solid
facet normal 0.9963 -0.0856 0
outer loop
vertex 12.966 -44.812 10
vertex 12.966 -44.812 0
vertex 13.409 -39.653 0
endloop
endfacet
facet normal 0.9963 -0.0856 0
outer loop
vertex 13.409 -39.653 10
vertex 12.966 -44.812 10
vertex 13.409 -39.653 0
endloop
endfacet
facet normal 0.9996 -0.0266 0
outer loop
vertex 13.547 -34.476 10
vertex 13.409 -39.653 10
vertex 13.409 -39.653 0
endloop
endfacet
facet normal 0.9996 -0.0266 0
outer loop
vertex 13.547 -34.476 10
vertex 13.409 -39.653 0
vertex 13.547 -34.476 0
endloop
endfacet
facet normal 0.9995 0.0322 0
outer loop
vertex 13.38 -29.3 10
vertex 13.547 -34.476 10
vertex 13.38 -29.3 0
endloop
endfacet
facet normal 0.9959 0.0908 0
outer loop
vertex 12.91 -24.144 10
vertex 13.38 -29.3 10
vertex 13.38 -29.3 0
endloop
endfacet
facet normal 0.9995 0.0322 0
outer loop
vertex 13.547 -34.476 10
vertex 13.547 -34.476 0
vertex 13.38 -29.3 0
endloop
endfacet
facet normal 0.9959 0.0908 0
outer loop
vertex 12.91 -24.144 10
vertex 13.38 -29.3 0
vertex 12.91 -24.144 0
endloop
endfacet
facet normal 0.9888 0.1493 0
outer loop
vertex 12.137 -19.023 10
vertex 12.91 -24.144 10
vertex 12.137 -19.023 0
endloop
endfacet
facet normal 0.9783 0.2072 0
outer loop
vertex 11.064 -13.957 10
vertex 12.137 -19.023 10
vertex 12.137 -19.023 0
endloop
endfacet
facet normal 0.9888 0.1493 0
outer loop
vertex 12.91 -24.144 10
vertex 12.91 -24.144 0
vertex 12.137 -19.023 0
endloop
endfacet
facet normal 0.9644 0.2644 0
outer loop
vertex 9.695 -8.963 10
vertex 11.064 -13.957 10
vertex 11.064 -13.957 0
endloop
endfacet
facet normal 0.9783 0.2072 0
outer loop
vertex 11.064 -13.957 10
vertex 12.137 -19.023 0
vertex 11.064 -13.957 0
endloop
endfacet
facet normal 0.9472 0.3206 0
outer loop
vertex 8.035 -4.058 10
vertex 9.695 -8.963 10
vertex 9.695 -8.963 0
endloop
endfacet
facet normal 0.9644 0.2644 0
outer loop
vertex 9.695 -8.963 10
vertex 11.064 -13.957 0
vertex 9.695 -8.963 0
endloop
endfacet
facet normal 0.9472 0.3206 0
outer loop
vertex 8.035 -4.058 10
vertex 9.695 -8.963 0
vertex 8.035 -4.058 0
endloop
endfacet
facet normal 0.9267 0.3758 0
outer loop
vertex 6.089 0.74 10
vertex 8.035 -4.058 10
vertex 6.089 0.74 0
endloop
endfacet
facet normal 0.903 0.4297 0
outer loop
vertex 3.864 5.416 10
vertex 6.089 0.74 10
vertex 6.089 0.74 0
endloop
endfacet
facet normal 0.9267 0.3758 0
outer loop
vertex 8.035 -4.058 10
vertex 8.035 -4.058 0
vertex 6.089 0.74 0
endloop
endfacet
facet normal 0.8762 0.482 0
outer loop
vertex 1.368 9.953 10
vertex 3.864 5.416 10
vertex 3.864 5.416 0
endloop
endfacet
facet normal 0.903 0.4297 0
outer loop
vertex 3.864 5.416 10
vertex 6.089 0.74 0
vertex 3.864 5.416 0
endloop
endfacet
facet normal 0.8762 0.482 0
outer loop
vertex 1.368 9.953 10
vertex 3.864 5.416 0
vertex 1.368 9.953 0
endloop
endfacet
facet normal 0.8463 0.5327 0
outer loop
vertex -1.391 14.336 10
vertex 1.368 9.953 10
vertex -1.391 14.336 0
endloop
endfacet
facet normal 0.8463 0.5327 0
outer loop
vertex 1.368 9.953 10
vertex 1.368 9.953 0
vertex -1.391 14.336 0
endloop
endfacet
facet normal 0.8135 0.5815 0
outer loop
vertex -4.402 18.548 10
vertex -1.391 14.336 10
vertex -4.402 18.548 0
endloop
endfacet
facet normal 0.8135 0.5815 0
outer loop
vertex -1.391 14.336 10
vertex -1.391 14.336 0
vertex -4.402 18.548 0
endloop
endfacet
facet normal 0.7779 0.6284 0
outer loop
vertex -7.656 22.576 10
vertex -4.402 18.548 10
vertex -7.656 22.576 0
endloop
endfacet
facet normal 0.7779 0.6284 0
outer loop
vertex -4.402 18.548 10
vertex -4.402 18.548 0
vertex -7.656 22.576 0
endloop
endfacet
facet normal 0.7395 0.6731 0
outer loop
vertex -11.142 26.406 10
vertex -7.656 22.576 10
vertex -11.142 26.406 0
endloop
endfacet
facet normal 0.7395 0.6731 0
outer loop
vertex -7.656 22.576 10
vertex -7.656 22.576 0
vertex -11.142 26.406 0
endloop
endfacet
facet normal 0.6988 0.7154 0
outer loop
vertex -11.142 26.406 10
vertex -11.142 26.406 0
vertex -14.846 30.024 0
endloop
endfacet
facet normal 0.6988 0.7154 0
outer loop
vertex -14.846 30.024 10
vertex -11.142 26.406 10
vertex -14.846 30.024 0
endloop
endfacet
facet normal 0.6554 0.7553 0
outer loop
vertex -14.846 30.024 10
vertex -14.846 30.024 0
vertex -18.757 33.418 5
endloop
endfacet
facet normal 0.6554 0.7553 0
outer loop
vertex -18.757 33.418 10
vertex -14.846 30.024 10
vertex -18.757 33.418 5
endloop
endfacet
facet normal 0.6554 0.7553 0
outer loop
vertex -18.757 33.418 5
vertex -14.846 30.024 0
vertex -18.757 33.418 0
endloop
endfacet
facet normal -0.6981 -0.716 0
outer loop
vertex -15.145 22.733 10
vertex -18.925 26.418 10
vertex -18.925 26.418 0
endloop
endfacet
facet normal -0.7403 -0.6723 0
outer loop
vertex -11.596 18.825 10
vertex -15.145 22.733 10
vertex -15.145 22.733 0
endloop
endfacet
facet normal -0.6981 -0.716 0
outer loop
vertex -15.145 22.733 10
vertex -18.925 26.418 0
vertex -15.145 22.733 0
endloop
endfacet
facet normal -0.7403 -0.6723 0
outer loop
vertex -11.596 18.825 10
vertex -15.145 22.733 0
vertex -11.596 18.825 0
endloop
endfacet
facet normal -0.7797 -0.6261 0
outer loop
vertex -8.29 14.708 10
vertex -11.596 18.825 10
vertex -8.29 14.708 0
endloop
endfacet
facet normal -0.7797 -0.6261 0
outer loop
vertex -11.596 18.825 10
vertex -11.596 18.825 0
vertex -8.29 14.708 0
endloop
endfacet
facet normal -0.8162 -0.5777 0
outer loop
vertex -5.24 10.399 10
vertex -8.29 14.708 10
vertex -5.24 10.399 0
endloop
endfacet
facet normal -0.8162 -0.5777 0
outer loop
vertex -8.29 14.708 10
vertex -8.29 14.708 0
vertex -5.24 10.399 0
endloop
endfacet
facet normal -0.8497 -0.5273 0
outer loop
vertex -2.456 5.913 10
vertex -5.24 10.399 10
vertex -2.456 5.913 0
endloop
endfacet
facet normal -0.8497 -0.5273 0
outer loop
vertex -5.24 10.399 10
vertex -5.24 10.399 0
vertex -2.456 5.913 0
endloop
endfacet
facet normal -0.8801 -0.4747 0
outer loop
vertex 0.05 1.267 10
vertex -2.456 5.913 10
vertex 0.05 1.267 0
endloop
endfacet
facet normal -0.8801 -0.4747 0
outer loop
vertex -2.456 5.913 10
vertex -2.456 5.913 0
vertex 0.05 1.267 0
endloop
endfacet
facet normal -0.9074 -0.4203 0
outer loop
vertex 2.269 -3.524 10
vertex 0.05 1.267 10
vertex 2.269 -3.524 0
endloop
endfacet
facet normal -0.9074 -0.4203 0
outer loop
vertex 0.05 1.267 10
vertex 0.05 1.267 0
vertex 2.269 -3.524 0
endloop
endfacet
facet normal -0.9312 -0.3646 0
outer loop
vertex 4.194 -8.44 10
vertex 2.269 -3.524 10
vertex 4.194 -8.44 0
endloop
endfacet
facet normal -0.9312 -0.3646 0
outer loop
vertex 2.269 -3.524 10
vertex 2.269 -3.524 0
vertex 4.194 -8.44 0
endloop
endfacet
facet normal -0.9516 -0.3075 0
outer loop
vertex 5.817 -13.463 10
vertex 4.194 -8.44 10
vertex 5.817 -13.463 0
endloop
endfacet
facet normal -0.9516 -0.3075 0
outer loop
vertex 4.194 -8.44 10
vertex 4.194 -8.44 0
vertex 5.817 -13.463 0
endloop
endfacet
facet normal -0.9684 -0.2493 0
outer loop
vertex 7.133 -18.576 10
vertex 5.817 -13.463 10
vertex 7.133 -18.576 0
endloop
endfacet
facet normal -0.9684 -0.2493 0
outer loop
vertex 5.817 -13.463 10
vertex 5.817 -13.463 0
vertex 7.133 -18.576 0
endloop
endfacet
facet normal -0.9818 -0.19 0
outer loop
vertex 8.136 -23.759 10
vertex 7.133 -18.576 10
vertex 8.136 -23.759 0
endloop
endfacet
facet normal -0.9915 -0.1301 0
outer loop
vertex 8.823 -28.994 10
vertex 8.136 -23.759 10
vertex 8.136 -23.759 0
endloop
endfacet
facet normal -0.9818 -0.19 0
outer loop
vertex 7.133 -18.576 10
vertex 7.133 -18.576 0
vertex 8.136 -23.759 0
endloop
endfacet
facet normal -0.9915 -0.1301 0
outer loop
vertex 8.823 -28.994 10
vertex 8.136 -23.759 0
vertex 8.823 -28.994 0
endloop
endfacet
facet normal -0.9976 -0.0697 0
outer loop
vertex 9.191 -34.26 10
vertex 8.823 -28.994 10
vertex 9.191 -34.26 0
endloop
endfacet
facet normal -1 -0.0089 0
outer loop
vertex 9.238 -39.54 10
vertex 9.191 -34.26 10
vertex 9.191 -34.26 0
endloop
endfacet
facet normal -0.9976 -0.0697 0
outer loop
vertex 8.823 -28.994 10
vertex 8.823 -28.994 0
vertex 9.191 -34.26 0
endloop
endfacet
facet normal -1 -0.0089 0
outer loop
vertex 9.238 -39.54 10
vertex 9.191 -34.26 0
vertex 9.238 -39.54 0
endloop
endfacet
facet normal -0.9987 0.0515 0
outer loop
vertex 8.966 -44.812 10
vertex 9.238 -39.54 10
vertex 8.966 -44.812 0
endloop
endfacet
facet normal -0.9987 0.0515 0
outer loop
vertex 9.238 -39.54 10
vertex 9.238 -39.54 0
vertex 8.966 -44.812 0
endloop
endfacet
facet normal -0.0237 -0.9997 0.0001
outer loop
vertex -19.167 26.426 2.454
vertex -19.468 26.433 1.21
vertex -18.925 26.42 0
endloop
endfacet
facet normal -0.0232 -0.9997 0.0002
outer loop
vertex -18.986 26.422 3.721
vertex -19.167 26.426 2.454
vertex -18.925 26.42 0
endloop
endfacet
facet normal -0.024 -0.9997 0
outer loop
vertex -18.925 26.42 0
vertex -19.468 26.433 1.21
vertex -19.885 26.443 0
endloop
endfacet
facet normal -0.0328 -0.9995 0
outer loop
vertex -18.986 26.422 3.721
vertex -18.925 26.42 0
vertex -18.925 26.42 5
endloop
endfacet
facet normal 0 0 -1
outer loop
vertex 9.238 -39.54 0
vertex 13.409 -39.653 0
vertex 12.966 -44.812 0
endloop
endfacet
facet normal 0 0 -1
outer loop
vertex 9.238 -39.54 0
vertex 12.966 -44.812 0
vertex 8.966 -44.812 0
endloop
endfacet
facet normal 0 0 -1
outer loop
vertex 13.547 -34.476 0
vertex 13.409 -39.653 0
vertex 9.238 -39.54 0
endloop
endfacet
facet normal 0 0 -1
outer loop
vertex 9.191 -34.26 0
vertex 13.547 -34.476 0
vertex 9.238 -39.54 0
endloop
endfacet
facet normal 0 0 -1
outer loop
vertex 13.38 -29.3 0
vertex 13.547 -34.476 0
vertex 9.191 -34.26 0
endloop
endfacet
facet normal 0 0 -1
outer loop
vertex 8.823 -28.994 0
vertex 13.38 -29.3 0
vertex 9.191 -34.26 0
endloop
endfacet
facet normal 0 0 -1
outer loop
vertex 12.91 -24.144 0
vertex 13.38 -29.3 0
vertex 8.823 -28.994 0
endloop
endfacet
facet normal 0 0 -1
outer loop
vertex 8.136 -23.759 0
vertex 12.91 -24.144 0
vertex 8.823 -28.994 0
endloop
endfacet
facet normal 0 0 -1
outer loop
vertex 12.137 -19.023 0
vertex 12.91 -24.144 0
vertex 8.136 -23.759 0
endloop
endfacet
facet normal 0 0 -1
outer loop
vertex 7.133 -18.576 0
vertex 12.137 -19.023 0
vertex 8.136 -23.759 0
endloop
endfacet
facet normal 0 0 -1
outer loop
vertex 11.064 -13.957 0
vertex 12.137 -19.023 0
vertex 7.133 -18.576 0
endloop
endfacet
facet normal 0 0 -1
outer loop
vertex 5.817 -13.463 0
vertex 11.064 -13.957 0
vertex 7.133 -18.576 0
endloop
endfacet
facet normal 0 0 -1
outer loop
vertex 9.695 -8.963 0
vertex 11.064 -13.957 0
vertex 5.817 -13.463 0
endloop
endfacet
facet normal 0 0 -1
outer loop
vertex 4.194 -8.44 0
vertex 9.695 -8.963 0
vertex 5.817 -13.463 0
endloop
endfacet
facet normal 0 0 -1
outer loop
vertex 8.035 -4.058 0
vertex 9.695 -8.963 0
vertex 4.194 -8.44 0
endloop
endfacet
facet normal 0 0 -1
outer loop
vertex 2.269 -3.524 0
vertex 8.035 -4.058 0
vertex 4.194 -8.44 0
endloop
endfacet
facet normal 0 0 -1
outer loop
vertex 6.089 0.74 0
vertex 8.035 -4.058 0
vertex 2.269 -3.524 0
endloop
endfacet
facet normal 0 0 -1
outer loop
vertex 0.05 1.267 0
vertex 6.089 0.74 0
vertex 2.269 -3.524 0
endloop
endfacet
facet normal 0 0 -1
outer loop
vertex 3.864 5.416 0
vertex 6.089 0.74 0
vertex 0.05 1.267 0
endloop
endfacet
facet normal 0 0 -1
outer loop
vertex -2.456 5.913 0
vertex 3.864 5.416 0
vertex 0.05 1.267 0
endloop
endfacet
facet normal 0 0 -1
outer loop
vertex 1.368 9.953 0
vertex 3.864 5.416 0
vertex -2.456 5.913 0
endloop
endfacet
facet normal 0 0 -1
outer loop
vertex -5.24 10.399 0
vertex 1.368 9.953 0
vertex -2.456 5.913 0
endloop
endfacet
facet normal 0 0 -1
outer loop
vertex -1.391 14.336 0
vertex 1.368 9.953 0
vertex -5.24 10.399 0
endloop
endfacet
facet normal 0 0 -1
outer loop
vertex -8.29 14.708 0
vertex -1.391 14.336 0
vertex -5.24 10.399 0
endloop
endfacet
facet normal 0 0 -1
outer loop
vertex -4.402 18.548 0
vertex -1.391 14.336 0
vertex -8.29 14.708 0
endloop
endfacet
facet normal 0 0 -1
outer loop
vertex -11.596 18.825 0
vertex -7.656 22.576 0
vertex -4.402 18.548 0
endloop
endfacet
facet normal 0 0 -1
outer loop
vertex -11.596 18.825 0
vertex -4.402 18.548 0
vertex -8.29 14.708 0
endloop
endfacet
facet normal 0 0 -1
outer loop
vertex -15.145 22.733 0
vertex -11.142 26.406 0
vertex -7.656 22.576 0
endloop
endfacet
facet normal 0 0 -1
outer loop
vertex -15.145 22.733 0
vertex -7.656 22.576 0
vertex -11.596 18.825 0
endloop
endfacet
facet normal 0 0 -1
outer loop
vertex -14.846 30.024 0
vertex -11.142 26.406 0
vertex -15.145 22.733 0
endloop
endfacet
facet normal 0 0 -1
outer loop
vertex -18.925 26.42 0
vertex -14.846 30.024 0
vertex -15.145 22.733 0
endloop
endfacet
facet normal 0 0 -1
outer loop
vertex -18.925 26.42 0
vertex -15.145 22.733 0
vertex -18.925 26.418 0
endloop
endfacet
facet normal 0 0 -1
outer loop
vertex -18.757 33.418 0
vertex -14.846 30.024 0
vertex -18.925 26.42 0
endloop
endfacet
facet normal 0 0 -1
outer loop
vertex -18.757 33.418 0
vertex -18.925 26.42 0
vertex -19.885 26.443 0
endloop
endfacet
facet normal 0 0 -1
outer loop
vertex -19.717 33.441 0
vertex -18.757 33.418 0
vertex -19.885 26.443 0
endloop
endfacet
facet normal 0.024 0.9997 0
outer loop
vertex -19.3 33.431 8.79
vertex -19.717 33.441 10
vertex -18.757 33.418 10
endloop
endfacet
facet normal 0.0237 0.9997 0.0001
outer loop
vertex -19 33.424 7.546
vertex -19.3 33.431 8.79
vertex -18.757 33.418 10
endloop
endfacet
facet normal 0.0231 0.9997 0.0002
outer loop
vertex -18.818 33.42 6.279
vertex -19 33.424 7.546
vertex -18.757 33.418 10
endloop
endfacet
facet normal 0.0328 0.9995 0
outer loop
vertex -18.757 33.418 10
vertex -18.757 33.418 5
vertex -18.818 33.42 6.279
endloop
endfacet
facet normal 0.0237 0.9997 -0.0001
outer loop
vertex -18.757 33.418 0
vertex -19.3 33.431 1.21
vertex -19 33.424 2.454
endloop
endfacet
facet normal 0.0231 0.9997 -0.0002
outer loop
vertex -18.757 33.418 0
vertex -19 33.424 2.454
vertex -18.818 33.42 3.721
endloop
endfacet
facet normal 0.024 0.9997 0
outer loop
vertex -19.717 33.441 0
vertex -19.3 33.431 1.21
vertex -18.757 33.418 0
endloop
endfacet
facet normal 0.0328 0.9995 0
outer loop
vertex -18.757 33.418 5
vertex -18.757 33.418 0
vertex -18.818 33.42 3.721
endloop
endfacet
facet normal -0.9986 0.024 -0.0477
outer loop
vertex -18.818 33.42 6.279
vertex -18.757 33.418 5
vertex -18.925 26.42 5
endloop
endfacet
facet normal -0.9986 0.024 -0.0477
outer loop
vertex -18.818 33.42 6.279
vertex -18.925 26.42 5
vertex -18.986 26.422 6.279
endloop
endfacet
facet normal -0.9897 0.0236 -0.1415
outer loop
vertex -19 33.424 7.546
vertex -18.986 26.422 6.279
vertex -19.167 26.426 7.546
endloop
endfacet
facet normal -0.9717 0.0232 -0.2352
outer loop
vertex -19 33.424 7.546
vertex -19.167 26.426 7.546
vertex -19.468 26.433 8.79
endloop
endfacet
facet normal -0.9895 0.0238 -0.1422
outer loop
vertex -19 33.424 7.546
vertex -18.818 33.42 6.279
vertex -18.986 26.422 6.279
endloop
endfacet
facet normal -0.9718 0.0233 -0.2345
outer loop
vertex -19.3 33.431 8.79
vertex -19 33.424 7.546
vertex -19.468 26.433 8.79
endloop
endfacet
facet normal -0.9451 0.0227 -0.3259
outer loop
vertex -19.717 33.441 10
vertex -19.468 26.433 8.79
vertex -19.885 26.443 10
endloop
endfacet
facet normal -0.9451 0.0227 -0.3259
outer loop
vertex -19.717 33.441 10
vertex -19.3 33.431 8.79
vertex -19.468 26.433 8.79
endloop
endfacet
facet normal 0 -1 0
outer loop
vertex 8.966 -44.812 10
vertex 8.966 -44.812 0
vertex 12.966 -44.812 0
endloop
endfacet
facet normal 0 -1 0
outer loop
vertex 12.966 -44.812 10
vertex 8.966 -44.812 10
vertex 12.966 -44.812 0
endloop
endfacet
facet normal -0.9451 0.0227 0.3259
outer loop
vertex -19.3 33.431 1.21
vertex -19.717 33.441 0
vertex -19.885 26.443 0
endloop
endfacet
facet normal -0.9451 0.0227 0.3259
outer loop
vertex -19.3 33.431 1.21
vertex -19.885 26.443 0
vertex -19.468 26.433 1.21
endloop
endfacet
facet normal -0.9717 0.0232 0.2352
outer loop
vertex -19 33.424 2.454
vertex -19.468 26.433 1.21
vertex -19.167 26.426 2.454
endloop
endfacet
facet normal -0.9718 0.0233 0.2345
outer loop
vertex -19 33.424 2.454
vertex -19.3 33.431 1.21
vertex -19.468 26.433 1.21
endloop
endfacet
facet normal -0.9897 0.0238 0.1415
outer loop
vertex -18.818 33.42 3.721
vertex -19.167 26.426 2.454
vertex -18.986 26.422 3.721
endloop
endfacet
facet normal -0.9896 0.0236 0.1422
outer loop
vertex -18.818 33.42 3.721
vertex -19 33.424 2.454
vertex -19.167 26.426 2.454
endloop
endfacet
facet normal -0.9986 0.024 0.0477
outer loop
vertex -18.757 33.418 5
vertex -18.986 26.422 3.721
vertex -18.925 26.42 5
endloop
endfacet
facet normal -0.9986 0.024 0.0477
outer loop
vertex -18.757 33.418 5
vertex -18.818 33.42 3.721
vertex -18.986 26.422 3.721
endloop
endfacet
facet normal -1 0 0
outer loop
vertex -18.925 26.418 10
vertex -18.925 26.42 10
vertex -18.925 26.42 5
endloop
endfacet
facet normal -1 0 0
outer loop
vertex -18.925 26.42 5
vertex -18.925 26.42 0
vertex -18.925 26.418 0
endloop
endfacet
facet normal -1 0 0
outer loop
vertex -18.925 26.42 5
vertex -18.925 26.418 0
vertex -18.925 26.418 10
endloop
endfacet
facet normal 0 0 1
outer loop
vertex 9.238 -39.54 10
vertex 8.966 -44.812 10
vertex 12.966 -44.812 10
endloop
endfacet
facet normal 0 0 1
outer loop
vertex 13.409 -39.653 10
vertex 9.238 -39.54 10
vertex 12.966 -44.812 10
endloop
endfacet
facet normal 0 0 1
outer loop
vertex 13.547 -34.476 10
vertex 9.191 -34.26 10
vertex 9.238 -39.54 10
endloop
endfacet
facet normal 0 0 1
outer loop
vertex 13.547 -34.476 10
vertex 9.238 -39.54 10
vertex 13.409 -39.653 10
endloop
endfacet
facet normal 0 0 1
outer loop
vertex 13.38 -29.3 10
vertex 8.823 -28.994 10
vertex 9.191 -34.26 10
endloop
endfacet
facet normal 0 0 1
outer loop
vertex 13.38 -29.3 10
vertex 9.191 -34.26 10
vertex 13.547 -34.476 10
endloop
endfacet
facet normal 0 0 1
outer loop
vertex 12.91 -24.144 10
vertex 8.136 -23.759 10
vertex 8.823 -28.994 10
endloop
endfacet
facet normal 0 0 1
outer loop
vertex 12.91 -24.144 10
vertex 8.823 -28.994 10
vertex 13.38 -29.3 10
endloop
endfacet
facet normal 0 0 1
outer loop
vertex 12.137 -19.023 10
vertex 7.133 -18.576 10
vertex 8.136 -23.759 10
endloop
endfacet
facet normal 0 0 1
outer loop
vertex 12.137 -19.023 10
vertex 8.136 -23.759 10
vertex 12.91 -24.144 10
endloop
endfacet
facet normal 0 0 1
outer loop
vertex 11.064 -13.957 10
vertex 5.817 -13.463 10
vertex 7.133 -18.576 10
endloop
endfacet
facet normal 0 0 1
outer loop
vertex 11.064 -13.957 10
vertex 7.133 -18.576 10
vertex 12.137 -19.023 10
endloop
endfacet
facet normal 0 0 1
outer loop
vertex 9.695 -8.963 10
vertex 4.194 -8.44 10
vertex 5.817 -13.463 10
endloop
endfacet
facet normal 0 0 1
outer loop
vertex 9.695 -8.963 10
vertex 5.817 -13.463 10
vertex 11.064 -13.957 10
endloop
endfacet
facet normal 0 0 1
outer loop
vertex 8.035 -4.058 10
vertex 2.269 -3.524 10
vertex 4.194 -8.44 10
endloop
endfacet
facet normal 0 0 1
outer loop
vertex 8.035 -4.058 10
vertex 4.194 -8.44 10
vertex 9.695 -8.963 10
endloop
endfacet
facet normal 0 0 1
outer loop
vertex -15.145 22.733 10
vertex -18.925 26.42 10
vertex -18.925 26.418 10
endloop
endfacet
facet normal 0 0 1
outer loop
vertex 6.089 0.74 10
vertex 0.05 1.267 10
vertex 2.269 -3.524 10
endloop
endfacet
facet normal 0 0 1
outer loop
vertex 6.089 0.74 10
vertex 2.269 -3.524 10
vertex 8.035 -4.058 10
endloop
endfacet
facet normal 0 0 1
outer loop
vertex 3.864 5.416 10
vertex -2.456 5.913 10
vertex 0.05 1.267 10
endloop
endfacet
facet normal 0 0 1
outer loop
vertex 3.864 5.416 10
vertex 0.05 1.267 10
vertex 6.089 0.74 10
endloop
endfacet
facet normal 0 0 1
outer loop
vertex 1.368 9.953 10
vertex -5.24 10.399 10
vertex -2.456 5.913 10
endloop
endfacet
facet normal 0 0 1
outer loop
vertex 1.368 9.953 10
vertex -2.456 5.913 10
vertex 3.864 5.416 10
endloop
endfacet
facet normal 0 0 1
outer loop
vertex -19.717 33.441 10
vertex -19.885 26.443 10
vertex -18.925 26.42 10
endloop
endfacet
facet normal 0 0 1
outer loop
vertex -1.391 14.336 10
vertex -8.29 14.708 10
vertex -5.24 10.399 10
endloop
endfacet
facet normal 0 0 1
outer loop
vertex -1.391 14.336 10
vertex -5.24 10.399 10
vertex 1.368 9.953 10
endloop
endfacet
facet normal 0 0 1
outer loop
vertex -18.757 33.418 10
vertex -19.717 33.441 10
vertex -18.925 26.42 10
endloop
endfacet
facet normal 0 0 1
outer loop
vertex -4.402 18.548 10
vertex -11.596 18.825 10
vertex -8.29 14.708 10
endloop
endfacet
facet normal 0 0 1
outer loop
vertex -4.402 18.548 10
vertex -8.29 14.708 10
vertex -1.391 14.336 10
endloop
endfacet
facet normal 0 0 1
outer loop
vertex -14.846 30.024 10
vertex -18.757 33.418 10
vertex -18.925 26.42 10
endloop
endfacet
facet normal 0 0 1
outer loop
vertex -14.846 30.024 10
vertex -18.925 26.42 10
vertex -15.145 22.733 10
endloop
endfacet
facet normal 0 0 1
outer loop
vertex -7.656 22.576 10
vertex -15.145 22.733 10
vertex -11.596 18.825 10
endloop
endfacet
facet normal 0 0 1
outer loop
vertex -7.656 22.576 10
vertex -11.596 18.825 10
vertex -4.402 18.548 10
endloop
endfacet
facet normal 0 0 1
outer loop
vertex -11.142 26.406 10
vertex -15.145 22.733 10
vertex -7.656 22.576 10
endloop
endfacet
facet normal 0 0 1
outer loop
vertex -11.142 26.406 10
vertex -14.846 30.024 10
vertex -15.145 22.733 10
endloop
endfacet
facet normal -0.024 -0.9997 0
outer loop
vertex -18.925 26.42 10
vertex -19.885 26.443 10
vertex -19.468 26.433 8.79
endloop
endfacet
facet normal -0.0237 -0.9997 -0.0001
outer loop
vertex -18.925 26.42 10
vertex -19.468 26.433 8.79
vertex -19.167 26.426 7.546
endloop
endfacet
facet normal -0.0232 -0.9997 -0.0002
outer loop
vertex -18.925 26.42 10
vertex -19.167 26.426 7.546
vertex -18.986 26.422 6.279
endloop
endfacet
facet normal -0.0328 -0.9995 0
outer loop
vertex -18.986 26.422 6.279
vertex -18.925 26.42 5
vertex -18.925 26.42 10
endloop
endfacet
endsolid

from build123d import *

# Parameters (mm, degrees)
BOSS_EXTRUDE1_DEPTH = 10
BOSS_EXTRUDE2_DEPTH = 7


with BuildPart() as part:
    # Sketch1 → Boss-Extrude1 (new body)
    with BuildSketch(Plane.XY):
        with BuildLine():
            Line((-18.757439303, 33.418117649), (-18.925359206, 26.418117649))
            ThreePointArc((-18.925359206, 26.418117649), (3.268987797, -5.966966431), (8.965935836, -44.811882351))
            Line((8.965935836, -44.811882351), (12.965935836, -44.811882351))
            ThreePointArc((12.965935836, -44.811882351), (7.097147968, -1.644619716), (-18.757439303, 33.418117649))
        make_face()
    extrude(amount=BOSS_EXTRUDE1_DEPTH)

    # Sketch2 → Boss-Extrude2 (add)
    with BuildSketch(Plane(origin=(0.790403617, 32.949193093, 0), x_dir=(0, 0, -1), z_dir=(0.02398165846895122, 0.9997123986712771, 0))):
        with BuildLine():
            Line((-10, 20.513530318), (-10, 19.553466522))
            Line((-10, 19.553466522), (-5, 19.553466522))
            ThreePointArc((-5, 19.553466522), (-7.545668993, 19.795654886), (-10, 20.513530318))
        make_face()
        with BuildLine():
            ThreePointArc((0, 20.513530318), (-2.454331007, 19.795654886), (-5, 19.553466522))
            Line((-5, 19.553466522), (0, 19.553466522))
            Line((0, 19.553466522), (0, 20.513530318))
        make_face()
    extrude(amount=-BOSS_EXTRUDE2_DEPTH)


solid = part.part
